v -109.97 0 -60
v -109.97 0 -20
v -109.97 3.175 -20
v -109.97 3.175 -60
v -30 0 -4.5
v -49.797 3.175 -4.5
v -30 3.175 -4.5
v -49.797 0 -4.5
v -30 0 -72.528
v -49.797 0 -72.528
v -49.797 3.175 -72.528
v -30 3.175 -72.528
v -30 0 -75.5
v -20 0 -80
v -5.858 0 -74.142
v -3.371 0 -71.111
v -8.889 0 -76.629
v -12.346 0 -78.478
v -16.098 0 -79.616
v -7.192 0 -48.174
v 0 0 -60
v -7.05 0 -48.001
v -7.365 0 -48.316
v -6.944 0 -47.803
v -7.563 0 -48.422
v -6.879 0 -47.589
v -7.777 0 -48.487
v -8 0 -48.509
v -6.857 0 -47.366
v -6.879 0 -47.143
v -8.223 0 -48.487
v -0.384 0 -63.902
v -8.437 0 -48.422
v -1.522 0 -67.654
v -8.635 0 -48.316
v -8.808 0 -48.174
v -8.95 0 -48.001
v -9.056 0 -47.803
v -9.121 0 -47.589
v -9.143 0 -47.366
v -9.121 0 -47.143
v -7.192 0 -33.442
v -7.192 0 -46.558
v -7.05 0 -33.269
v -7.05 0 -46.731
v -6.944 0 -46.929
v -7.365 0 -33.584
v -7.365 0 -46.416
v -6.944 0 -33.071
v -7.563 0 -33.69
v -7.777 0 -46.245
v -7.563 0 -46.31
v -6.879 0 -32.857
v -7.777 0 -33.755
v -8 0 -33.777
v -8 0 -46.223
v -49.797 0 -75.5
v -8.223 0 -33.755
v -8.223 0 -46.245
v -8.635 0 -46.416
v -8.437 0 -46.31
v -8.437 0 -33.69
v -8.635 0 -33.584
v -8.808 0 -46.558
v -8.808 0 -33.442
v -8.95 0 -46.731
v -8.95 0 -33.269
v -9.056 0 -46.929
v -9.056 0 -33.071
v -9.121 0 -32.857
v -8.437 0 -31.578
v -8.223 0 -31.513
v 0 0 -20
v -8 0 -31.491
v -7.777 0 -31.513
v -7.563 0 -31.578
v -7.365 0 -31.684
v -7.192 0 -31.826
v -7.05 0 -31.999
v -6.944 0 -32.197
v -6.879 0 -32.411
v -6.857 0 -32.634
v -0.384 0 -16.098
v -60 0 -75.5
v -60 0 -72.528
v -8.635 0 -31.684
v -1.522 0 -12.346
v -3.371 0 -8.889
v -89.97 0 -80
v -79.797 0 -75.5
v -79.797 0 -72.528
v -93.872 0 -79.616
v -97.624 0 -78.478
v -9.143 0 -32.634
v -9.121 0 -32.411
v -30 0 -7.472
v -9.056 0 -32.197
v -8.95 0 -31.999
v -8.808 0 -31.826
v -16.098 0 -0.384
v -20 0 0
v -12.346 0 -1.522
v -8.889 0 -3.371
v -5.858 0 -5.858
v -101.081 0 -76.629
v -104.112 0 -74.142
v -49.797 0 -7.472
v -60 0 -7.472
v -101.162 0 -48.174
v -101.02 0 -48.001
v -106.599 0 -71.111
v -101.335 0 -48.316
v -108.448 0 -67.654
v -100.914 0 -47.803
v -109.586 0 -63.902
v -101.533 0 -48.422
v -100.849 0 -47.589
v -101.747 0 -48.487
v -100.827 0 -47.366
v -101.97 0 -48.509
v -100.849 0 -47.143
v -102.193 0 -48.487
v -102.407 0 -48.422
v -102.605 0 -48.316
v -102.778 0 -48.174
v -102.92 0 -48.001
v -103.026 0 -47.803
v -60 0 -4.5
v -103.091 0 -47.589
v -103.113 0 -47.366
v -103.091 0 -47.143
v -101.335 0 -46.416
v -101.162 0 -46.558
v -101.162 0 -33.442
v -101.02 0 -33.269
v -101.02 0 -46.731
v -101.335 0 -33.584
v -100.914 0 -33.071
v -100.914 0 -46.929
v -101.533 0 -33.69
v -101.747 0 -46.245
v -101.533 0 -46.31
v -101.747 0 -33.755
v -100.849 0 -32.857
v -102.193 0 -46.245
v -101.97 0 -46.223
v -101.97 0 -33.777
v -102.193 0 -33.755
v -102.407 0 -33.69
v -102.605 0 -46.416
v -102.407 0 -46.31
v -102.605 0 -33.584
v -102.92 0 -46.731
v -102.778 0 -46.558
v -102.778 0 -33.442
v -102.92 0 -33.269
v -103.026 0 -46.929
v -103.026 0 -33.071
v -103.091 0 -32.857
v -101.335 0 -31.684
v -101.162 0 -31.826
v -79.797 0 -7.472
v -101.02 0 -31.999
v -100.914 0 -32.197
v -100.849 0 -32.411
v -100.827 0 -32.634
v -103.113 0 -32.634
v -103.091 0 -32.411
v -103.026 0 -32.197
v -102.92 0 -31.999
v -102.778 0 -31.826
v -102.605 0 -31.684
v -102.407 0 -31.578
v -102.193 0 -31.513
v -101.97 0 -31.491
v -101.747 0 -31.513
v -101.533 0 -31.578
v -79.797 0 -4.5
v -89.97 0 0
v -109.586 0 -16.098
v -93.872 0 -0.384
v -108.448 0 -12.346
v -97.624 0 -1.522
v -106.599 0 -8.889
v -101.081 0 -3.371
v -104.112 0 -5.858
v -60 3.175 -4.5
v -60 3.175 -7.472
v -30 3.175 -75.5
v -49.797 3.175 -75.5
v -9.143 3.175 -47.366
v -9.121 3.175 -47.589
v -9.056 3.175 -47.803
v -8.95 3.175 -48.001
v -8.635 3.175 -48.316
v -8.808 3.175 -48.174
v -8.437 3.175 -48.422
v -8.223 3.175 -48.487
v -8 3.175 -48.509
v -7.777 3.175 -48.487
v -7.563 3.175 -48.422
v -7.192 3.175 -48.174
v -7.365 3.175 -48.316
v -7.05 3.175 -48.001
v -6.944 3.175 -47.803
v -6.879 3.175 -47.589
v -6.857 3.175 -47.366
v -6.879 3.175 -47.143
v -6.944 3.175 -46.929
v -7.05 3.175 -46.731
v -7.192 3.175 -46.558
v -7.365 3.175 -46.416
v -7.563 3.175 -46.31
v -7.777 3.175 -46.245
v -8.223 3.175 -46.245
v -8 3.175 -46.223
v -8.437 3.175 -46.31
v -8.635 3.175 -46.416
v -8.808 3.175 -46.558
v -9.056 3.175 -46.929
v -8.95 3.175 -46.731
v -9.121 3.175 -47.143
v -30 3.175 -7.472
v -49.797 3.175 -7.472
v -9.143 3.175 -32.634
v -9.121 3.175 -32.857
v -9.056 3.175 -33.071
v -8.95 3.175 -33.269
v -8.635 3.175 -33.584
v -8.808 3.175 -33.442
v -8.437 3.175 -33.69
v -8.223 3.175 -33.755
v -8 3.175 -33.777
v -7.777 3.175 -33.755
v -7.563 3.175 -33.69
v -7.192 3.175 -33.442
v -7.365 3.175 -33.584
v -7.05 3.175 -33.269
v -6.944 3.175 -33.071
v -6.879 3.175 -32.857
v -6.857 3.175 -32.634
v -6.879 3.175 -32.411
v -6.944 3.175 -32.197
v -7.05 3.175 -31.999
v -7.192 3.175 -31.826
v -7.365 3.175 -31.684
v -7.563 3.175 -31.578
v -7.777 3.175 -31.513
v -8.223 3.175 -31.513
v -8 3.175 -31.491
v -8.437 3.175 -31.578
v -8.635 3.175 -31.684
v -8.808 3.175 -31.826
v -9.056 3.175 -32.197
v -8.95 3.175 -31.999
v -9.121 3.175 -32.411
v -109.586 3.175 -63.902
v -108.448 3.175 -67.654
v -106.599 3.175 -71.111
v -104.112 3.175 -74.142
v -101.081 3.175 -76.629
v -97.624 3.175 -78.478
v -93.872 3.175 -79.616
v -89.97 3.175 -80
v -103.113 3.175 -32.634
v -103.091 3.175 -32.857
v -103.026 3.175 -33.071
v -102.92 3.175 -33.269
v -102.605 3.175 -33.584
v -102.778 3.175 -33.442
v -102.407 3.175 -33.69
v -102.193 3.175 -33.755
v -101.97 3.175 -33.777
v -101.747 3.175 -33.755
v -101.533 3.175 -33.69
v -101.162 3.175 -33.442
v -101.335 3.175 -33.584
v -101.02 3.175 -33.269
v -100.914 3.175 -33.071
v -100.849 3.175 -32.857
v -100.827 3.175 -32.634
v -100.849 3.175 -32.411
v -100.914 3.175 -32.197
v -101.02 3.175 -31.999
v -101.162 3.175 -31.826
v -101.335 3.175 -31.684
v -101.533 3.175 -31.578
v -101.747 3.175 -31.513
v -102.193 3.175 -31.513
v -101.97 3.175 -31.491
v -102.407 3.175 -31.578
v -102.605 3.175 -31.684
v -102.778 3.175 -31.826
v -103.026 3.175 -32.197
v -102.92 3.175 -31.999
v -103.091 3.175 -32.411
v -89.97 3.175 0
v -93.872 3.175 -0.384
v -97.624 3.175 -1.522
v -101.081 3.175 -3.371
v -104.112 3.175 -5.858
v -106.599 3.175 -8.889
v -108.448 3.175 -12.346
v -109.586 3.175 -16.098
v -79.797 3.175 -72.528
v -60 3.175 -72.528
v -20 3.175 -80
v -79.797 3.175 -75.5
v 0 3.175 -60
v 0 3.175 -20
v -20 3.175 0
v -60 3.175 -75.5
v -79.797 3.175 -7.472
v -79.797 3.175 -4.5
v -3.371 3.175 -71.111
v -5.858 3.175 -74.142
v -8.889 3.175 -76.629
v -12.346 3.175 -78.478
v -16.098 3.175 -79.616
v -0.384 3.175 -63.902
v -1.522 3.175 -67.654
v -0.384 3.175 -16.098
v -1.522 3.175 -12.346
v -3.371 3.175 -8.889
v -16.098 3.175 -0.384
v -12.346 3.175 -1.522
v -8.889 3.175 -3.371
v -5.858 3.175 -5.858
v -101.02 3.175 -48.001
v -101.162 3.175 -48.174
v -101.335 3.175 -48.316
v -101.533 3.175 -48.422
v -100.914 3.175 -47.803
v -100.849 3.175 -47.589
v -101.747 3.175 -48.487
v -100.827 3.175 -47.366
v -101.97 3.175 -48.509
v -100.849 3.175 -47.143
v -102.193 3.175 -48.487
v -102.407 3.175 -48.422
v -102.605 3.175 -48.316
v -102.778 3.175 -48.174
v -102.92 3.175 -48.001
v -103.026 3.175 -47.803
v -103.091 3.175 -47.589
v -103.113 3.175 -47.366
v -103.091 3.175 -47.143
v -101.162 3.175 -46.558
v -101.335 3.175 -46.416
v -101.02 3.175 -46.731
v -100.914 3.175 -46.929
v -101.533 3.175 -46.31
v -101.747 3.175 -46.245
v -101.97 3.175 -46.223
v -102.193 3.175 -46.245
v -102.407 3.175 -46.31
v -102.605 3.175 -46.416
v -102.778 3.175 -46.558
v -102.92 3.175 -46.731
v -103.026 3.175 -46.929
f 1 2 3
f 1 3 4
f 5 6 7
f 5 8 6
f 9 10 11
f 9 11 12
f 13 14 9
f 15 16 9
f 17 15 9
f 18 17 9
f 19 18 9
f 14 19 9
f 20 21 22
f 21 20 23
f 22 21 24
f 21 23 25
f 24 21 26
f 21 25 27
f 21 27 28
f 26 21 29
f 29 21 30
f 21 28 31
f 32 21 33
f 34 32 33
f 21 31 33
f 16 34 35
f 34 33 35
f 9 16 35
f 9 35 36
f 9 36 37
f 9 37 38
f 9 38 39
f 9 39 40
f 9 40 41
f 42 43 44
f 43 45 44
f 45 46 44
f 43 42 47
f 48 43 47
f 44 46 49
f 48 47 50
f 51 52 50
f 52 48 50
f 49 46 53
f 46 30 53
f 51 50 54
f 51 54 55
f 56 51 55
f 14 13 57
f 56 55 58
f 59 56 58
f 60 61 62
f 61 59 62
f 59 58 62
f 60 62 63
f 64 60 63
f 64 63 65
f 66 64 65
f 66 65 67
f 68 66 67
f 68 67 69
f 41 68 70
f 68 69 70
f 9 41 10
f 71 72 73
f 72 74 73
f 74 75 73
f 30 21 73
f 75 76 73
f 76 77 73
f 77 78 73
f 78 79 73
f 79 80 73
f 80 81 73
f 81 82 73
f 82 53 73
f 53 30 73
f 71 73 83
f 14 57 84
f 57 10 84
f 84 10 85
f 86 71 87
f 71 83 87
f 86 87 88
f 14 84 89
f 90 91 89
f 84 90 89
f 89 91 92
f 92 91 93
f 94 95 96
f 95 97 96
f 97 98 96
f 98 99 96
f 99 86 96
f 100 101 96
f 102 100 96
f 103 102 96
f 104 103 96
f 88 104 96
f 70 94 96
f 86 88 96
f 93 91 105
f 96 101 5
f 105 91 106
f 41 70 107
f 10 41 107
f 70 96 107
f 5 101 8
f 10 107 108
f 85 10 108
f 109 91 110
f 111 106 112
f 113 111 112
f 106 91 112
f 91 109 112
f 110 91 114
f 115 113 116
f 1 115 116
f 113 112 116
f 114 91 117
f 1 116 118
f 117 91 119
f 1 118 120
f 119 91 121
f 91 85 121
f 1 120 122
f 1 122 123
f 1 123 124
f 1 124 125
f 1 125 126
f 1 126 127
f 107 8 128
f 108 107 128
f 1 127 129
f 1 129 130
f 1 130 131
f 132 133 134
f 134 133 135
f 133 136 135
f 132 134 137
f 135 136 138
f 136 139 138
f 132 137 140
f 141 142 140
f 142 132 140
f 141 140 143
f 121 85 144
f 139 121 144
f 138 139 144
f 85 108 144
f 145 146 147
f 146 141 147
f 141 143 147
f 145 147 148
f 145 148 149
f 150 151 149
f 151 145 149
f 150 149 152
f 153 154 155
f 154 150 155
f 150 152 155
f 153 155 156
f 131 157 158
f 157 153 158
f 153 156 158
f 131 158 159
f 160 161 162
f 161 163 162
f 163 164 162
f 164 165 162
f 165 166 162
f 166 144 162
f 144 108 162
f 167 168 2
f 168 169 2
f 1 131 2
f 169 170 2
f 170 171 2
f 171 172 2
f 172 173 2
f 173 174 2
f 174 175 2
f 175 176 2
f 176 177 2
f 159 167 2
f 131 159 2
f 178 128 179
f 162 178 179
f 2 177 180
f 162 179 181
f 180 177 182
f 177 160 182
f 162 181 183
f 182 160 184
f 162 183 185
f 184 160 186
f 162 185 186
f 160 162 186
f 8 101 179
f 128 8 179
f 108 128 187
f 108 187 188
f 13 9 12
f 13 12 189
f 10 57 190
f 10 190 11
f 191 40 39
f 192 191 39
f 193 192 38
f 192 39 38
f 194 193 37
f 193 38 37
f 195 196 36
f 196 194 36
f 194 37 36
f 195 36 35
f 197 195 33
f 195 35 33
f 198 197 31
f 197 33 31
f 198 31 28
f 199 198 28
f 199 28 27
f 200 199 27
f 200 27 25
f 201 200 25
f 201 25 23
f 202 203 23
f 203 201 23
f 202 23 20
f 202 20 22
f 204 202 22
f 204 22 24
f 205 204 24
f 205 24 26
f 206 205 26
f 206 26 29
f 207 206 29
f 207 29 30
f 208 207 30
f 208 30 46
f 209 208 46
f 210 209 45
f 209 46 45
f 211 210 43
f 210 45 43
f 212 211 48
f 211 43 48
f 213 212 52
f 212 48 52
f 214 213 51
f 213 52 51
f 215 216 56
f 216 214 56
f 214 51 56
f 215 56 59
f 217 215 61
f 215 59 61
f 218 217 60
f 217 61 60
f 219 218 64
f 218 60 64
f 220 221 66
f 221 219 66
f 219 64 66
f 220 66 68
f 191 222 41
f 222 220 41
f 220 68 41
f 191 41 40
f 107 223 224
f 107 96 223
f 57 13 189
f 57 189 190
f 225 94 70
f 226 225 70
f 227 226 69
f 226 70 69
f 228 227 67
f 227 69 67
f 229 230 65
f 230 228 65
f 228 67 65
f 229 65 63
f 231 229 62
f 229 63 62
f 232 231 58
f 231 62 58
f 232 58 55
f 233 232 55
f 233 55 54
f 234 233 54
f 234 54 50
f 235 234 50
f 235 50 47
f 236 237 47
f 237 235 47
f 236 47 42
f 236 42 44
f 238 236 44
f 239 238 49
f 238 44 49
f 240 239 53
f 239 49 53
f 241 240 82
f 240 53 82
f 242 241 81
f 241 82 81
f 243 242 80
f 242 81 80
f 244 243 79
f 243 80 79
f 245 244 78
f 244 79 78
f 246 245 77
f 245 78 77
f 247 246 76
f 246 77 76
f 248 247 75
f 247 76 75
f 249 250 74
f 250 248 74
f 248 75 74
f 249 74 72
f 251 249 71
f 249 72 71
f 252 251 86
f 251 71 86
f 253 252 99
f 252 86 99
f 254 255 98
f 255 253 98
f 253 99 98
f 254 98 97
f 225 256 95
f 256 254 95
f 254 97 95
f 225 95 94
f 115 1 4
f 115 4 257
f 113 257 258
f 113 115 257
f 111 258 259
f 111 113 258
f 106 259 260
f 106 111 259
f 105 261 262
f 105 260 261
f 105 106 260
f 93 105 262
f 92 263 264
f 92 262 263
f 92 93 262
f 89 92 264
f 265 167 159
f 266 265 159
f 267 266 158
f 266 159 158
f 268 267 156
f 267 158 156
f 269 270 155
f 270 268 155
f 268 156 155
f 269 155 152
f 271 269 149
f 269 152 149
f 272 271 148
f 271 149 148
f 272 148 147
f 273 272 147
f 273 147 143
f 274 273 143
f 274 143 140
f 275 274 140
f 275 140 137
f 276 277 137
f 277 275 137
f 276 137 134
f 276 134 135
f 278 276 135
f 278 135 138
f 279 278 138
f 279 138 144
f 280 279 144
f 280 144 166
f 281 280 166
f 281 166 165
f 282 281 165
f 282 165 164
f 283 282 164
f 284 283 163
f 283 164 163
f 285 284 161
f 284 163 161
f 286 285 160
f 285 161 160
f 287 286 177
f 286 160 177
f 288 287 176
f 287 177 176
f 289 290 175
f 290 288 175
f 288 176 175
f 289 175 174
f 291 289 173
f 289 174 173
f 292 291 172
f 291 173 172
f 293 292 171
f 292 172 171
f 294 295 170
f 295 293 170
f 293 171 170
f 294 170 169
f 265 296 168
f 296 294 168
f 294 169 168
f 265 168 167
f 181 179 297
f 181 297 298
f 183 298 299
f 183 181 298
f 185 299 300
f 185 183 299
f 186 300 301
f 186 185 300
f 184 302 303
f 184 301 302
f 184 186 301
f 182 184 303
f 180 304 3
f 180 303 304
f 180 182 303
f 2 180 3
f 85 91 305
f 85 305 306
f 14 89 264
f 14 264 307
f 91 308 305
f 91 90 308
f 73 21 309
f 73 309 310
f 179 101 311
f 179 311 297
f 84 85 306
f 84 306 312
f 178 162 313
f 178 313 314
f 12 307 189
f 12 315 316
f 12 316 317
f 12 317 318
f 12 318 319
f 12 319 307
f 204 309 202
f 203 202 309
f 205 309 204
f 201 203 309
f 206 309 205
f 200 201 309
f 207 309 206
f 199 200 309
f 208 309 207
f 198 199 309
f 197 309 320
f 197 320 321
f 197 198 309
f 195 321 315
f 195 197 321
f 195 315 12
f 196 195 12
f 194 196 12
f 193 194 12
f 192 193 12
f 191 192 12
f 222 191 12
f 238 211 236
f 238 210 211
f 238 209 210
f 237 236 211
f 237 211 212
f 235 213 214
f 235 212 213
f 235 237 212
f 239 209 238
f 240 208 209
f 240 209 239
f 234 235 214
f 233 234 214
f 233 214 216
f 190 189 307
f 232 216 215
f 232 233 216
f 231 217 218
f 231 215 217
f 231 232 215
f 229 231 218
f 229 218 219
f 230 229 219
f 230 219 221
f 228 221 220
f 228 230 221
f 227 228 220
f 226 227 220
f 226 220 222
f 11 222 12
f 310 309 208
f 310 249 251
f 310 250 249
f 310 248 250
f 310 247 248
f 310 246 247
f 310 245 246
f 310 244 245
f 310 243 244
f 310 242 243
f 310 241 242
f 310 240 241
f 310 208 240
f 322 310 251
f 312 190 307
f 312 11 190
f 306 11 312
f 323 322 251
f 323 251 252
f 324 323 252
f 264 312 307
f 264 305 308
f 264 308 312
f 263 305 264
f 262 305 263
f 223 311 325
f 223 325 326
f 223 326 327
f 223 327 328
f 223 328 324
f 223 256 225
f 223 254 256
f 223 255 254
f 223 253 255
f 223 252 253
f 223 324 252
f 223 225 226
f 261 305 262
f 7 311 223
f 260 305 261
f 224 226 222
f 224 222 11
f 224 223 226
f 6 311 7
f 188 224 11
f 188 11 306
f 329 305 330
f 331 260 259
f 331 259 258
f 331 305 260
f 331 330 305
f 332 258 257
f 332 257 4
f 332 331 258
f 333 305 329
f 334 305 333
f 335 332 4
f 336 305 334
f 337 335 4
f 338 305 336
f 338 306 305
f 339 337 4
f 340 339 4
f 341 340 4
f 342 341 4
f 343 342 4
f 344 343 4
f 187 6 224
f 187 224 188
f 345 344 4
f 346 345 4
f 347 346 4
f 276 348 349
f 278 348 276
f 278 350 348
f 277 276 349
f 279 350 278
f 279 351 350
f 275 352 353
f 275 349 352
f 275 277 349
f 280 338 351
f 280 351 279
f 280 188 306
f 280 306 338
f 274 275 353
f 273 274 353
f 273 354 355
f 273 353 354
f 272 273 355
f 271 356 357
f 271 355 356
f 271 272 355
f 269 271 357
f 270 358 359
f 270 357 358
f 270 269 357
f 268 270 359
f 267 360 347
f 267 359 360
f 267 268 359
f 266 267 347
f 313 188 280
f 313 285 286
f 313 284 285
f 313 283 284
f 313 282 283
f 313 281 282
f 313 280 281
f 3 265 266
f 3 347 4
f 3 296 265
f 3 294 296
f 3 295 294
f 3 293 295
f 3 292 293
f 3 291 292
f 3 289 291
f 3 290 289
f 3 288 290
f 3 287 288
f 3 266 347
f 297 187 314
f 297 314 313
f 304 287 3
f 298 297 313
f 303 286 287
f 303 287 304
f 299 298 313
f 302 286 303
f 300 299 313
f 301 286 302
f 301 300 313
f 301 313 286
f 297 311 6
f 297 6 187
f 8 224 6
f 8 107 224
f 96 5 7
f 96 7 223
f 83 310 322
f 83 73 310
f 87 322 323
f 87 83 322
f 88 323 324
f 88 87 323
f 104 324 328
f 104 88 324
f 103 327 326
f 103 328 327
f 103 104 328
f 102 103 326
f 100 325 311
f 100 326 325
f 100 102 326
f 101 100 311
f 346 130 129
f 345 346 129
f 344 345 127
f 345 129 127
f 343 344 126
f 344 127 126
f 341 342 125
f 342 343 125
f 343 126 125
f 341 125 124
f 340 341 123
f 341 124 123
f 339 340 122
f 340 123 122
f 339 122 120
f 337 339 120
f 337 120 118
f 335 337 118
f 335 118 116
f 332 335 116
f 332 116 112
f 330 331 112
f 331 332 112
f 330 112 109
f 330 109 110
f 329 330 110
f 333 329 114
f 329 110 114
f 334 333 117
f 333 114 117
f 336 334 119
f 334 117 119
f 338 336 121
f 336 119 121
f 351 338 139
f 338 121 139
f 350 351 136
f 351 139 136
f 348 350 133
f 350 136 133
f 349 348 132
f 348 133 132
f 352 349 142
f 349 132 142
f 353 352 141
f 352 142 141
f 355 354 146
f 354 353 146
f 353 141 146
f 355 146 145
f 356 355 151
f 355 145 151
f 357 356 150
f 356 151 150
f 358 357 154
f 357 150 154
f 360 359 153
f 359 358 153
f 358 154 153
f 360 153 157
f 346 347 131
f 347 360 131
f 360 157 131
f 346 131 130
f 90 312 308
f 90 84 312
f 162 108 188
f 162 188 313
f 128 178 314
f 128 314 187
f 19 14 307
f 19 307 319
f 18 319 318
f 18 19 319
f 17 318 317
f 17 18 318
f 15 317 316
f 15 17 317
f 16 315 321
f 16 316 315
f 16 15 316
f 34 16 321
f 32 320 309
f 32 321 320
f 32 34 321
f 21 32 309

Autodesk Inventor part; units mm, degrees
ref_plane "YZ Plane" through (0, 0, 0) normal (1, 0, 0) x (0, 1, 0)
ref_plane "XZ Plane" through (0, 0, 0) normal (0, 1, 0) x (-1, 0, 0)
ref_plane "XY Plane" through (0, 0, 0) normal (0, 0, 1) x (1, 0, 0)
sketch "Sketch1" plane through (0, 0, 0) normal (0, 1, 0) x (-1, 0, 0)
  line L0 (20, 0) -> (89.97, 0)
  line L1 (109.97, -20) -> (109.97, -60)
  line L2 (89.97, -80) -> (20, -80)
  line L3 (0, -60) -> (0, -20)
  line L4 (79.7968, -72.5282) -> (60, -72.5282)
  line L5 (60, -72.5282) -> (60, -75.5)
  line L6 (60, -75.5) -> (79.7968, -75.5)
  line L7 (79.7968, -75.5) -> (79.7968, -72.5282)
  circle A0 centre (101.97, -32.634) radius 1.143
  circle A1 centre (101.97, -47.366) radius 1.143
  circle A2 centre (8, -32.634) radius 1.143
  circle A3 centre (8, -47.366) radius 1.143
  arc A4 (109.97, -20) -> (89.97, 0) centre (89.97, -20) ccw
  arc A5 (0, -60) -> (20, -80) centre (20, -60) ccw
  arc A6 (89.97, -80) -> (109.97, -60) centre (89.97, -60) ccw
  arc A7 (20, 0) -> (0, -20) centre (20, -20) ccw
  line L8 (49.7968, -4.5) -> (30, -4.5)
  line L9 (30, -4.5) -> (30, -7.4718)
  line L10 (30, -7.4718) -> (49.7968, -7.4718)
  line L11 (49.7968, -7.4718) -> (49.7968, -4.5)
  line L12 (49.7968, -72.5282) -> (30, -72.5282)
  line L13 (30, -72.5282) -> (30, -75.5)
  line L14 (30, -75.5) -> (49.7968, -75.5)
  line L15 (49.7968, -75.5) -> (49.7968, -72.5282)
  line L16 (60, -7.4718) -> (79.7968, -7.4718)
  line L17 (79.7968, -7.4718) -> (79.7968, -4.5)
  line L18 (79.7968, -4.5) -> (60, -4.5)
  line L19 (60, -4.5) -> (60, -7.4718)
  point P0 (0, 0)
  point P1 (109.97, -80)
  point P2 (109.97, 0)
  point P3 (0, -80)
  dimension "d0" = 109.97
  dimension "d1" = 80
  dimension "d2" = 19.7968
  dimension "d3" = 2.9718
  dimension "d7" = 4.5
  dimension "d9" = 2.286
  dimension "d10" = 2.286
  dimension "d11" = 14.732
  dimension "d12" = 32.634
  dimension "d13" = 8
  dimension "d14" = 8
  dimension "d15" = 2.286
  dimension "d16" = 2.286
  dimension "d17" = 8
  dimension "d18" = 8
  dimension "d19" = 20
  dimension "d20" = 20
  dimension "d21" = 20
  dimension "d24" = 19.7968
  dimension "d25" = 30
  dimension "d30" = 2.9718
  dimension "d33" = 4.5
  dimension "d34" = 10.2032
  dimension "d35" = 32.634
  dimension "d36" = 14.732
extrude "Extrusion4" add sketch "Sketch1" along normal blind 3.175
equation "\"d10\" = d9"
equation "\"d12\" = -0.5 * d11 + 0.5 * d1"
equation "\"d15\" = d9"
equation "\"d16\" = d9"
equation "\"d24\" = d2"
equation "\"d30\" = d3"
equation "\"d35\" = d12"
equation "\"d36\" = d11"
properties part number "base_plate"
